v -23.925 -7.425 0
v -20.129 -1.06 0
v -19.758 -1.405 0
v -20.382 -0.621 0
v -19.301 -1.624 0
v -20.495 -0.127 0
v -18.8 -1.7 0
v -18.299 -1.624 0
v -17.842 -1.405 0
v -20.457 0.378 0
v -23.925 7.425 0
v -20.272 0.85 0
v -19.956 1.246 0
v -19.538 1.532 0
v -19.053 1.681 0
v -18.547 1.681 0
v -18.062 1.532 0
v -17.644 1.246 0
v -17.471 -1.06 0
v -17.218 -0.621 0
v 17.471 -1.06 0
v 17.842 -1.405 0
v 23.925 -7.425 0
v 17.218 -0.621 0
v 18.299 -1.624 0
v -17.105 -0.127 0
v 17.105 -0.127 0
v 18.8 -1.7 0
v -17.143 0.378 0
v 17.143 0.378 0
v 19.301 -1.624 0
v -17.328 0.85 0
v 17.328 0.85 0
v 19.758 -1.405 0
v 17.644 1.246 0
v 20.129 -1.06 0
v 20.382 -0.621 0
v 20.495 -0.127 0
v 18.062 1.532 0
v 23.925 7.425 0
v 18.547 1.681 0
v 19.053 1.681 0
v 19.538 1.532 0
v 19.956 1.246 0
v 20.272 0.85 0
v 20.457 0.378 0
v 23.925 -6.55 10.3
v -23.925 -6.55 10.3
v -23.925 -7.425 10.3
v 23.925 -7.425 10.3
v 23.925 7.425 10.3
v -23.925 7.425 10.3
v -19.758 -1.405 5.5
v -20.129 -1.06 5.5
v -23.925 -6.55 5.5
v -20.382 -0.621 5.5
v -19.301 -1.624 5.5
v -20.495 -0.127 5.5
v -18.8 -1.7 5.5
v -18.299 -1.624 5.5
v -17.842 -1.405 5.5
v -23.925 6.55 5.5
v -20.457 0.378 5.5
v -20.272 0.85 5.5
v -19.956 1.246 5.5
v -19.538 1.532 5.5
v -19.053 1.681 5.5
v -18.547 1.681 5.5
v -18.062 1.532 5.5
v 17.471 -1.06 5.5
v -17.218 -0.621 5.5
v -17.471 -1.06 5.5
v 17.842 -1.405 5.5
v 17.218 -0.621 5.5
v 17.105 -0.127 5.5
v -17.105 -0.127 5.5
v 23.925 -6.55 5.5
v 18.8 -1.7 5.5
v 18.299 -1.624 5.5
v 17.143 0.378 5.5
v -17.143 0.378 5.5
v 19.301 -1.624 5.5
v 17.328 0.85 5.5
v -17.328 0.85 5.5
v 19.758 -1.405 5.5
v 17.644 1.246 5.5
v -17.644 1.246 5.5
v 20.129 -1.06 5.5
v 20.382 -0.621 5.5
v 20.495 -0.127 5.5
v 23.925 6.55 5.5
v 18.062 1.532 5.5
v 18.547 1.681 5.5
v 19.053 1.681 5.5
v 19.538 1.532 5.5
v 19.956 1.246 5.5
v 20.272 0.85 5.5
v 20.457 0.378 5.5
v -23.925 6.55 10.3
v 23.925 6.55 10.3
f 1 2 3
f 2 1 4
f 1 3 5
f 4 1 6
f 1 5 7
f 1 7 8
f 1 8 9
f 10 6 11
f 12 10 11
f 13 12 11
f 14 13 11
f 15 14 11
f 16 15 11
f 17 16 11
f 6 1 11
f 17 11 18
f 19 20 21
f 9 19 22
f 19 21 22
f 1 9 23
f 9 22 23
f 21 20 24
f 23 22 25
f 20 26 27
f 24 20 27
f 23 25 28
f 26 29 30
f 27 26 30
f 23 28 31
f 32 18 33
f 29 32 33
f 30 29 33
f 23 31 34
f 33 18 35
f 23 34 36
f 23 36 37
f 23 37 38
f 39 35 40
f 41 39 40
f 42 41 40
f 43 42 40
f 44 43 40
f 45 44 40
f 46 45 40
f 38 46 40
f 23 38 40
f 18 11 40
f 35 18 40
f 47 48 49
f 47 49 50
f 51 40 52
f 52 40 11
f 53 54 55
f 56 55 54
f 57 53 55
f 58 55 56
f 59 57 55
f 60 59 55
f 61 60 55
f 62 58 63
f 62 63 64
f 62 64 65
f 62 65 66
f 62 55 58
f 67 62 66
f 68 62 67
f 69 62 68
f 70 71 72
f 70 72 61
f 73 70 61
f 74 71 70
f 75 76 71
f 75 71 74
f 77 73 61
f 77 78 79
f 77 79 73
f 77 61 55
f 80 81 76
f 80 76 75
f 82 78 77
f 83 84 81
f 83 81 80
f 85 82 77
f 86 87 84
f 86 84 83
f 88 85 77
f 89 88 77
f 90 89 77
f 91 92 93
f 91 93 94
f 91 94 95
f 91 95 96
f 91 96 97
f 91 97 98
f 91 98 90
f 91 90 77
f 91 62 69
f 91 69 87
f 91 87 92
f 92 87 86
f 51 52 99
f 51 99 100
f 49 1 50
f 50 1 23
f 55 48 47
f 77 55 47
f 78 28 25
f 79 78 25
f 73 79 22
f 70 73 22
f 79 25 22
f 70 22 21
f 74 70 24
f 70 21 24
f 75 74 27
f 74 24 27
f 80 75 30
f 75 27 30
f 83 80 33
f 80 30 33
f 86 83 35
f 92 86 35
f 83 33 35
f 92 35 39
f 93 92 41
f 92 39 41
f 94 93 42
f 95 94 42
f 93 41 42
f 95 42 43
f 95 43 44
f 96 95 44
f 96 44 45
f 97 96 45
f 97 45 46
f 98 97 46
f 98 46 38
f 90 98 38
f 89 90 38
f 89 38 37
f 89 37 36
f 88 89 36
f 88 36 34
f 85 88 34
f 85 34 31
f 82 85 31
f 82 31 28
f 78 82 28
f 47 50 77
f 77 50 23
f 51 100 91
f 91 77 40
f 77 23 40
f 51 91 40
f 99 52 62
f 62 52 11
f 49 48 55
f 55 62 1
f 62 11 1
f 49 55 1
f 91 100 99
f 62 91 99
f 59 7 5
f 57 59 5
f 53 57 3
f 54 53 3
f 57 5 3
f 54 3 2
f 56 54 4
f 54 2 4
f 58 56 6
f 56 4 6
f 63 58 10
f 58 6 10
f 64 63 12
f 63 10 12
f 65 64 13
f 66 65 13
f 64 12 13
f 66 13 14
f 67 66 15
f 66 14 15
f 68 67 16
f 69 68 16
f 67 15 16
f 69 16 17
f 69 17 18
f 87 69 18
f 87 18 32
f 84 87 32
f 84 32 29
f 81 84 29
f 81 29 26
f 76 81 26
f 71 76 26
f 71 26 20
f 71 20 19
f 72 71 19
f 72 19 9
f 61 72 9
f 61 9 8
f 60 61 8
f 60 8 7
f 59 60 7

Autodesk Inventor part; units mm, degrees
ref_plane "YZ Plane" through (0, 0, 0) normal (1, 0, 0) x (0, 1, 0)
ref_plane "XZ Plane" through (0, 0, 0) normal (0, 1, 0) x (-1, 0, 0)
ref_plane "XY Plane" through (0, 0, 0) normal (0, 0, 1) x (1, 0, 0)
sketch "Sketch1" plane through (0, 0, 0) normal (0, 0, 1) x (1, 0, 0)
  line L0 (-23.925, -7.425) -> (23.925, -7.425)
  line L1 (23.925, -7.425) -> (23.925, 7.425)
  line L2 (23.925, 7.425) -> (-23.925, 7.425)
  line L3 (-23.925, 7.425) -> (-23.925, -7.425)
  line L4 (-23.925, -7.425) -> (23.925, 7.425) construction
  line L5 (23.925, -7.425) -> (-23.925, 7.425) construction
  point P0 (0, 0)
  dimension "d0" = 47.85
  dimension "d1" = 14.85
extrude "Extrusion1" add sketch "Sketch1" along normal blind 10.3
sketch "Sketch3" plane through (0, 0, 10.3) normal (0, 0, 1) x (1, 0, 0)
  line L0 (23.925, -7.425) -> (23.925, 7.425) projected
  line L1 (-23.925, 7.425) -> (-23.925, -7.425) projected
  line L2 (-23.925, -6.55) -> (23.925, -6.55)
  line L3 (23.925, -6.55) -> (23.925, 6.55)
  line L4 (23.925, 6.55) -> (-23.925, 6.55)
  line L5 (-23.925, 6.55) -> (-23.925, -6.55)
  line L6 (-23.925, -6.55) -> (23.925, 6.55) construction
  line L7 (23.925, -6.55) -> (-23.925, 6.55) construction
  point P0 (0, 0)
  dimension "d5" = 13.1
extrude "Extrusion2" cut sketch "Sketch3" against normal blind 4.8
sketch "Sketch4" plane through (0, 0, 5.5) normal (0, 0, 1) x (1, 0, 0)
  line L0 (-23.925, -6.55) -> (-23.925, 6.55) construction
  line L1 (-23.925, 0) -> (23.925, 0) construction
  line L2 (23.925, 6.55) -> (23.925, -6.55) construction
  point P0 (0, 0)
  point P1 (-18.8, 0)
  point P2 (18.8, 0)
  point P3 (0, 0)
  dimension "d8" = 18.8
  dimension "d9" = 18.8
hole "Hole1" at (-18.8, 0, 5.5) at (18.8, 0, 5.5) direction (0, 0, -1) diameter 3.4 end through all clearance for "Flat Head Machine Screw" size "M3" standard "Ansi Metric M Profile"
equation "\"d0\" = sensorLength"
equation "\"d1\" = sensorWidth"
equation "\"d2\" = sensorDepth"
equation "\"d5\" = slotWidth"
equation "\"d6\" = slotDepth"
equation "\"d8\" = 0.5 * holeWidth"
equation "\"d9\" = 0.5 * holeWidth"
equation "\"sensorWidth\" = 14.85"
equation "\"sensorLength\" = 47.85"
equation "\"sensorDepth\" = 10.3"
equation "\"slotWidth\" = 13.1"
equation "\"slotDepth\" = 4.8"
equation "\"holeWidth\" = 37.6"
equation "\"holeDiameter\" = 3.4"
properties part number "sensor" material "Aluminum 6061"
